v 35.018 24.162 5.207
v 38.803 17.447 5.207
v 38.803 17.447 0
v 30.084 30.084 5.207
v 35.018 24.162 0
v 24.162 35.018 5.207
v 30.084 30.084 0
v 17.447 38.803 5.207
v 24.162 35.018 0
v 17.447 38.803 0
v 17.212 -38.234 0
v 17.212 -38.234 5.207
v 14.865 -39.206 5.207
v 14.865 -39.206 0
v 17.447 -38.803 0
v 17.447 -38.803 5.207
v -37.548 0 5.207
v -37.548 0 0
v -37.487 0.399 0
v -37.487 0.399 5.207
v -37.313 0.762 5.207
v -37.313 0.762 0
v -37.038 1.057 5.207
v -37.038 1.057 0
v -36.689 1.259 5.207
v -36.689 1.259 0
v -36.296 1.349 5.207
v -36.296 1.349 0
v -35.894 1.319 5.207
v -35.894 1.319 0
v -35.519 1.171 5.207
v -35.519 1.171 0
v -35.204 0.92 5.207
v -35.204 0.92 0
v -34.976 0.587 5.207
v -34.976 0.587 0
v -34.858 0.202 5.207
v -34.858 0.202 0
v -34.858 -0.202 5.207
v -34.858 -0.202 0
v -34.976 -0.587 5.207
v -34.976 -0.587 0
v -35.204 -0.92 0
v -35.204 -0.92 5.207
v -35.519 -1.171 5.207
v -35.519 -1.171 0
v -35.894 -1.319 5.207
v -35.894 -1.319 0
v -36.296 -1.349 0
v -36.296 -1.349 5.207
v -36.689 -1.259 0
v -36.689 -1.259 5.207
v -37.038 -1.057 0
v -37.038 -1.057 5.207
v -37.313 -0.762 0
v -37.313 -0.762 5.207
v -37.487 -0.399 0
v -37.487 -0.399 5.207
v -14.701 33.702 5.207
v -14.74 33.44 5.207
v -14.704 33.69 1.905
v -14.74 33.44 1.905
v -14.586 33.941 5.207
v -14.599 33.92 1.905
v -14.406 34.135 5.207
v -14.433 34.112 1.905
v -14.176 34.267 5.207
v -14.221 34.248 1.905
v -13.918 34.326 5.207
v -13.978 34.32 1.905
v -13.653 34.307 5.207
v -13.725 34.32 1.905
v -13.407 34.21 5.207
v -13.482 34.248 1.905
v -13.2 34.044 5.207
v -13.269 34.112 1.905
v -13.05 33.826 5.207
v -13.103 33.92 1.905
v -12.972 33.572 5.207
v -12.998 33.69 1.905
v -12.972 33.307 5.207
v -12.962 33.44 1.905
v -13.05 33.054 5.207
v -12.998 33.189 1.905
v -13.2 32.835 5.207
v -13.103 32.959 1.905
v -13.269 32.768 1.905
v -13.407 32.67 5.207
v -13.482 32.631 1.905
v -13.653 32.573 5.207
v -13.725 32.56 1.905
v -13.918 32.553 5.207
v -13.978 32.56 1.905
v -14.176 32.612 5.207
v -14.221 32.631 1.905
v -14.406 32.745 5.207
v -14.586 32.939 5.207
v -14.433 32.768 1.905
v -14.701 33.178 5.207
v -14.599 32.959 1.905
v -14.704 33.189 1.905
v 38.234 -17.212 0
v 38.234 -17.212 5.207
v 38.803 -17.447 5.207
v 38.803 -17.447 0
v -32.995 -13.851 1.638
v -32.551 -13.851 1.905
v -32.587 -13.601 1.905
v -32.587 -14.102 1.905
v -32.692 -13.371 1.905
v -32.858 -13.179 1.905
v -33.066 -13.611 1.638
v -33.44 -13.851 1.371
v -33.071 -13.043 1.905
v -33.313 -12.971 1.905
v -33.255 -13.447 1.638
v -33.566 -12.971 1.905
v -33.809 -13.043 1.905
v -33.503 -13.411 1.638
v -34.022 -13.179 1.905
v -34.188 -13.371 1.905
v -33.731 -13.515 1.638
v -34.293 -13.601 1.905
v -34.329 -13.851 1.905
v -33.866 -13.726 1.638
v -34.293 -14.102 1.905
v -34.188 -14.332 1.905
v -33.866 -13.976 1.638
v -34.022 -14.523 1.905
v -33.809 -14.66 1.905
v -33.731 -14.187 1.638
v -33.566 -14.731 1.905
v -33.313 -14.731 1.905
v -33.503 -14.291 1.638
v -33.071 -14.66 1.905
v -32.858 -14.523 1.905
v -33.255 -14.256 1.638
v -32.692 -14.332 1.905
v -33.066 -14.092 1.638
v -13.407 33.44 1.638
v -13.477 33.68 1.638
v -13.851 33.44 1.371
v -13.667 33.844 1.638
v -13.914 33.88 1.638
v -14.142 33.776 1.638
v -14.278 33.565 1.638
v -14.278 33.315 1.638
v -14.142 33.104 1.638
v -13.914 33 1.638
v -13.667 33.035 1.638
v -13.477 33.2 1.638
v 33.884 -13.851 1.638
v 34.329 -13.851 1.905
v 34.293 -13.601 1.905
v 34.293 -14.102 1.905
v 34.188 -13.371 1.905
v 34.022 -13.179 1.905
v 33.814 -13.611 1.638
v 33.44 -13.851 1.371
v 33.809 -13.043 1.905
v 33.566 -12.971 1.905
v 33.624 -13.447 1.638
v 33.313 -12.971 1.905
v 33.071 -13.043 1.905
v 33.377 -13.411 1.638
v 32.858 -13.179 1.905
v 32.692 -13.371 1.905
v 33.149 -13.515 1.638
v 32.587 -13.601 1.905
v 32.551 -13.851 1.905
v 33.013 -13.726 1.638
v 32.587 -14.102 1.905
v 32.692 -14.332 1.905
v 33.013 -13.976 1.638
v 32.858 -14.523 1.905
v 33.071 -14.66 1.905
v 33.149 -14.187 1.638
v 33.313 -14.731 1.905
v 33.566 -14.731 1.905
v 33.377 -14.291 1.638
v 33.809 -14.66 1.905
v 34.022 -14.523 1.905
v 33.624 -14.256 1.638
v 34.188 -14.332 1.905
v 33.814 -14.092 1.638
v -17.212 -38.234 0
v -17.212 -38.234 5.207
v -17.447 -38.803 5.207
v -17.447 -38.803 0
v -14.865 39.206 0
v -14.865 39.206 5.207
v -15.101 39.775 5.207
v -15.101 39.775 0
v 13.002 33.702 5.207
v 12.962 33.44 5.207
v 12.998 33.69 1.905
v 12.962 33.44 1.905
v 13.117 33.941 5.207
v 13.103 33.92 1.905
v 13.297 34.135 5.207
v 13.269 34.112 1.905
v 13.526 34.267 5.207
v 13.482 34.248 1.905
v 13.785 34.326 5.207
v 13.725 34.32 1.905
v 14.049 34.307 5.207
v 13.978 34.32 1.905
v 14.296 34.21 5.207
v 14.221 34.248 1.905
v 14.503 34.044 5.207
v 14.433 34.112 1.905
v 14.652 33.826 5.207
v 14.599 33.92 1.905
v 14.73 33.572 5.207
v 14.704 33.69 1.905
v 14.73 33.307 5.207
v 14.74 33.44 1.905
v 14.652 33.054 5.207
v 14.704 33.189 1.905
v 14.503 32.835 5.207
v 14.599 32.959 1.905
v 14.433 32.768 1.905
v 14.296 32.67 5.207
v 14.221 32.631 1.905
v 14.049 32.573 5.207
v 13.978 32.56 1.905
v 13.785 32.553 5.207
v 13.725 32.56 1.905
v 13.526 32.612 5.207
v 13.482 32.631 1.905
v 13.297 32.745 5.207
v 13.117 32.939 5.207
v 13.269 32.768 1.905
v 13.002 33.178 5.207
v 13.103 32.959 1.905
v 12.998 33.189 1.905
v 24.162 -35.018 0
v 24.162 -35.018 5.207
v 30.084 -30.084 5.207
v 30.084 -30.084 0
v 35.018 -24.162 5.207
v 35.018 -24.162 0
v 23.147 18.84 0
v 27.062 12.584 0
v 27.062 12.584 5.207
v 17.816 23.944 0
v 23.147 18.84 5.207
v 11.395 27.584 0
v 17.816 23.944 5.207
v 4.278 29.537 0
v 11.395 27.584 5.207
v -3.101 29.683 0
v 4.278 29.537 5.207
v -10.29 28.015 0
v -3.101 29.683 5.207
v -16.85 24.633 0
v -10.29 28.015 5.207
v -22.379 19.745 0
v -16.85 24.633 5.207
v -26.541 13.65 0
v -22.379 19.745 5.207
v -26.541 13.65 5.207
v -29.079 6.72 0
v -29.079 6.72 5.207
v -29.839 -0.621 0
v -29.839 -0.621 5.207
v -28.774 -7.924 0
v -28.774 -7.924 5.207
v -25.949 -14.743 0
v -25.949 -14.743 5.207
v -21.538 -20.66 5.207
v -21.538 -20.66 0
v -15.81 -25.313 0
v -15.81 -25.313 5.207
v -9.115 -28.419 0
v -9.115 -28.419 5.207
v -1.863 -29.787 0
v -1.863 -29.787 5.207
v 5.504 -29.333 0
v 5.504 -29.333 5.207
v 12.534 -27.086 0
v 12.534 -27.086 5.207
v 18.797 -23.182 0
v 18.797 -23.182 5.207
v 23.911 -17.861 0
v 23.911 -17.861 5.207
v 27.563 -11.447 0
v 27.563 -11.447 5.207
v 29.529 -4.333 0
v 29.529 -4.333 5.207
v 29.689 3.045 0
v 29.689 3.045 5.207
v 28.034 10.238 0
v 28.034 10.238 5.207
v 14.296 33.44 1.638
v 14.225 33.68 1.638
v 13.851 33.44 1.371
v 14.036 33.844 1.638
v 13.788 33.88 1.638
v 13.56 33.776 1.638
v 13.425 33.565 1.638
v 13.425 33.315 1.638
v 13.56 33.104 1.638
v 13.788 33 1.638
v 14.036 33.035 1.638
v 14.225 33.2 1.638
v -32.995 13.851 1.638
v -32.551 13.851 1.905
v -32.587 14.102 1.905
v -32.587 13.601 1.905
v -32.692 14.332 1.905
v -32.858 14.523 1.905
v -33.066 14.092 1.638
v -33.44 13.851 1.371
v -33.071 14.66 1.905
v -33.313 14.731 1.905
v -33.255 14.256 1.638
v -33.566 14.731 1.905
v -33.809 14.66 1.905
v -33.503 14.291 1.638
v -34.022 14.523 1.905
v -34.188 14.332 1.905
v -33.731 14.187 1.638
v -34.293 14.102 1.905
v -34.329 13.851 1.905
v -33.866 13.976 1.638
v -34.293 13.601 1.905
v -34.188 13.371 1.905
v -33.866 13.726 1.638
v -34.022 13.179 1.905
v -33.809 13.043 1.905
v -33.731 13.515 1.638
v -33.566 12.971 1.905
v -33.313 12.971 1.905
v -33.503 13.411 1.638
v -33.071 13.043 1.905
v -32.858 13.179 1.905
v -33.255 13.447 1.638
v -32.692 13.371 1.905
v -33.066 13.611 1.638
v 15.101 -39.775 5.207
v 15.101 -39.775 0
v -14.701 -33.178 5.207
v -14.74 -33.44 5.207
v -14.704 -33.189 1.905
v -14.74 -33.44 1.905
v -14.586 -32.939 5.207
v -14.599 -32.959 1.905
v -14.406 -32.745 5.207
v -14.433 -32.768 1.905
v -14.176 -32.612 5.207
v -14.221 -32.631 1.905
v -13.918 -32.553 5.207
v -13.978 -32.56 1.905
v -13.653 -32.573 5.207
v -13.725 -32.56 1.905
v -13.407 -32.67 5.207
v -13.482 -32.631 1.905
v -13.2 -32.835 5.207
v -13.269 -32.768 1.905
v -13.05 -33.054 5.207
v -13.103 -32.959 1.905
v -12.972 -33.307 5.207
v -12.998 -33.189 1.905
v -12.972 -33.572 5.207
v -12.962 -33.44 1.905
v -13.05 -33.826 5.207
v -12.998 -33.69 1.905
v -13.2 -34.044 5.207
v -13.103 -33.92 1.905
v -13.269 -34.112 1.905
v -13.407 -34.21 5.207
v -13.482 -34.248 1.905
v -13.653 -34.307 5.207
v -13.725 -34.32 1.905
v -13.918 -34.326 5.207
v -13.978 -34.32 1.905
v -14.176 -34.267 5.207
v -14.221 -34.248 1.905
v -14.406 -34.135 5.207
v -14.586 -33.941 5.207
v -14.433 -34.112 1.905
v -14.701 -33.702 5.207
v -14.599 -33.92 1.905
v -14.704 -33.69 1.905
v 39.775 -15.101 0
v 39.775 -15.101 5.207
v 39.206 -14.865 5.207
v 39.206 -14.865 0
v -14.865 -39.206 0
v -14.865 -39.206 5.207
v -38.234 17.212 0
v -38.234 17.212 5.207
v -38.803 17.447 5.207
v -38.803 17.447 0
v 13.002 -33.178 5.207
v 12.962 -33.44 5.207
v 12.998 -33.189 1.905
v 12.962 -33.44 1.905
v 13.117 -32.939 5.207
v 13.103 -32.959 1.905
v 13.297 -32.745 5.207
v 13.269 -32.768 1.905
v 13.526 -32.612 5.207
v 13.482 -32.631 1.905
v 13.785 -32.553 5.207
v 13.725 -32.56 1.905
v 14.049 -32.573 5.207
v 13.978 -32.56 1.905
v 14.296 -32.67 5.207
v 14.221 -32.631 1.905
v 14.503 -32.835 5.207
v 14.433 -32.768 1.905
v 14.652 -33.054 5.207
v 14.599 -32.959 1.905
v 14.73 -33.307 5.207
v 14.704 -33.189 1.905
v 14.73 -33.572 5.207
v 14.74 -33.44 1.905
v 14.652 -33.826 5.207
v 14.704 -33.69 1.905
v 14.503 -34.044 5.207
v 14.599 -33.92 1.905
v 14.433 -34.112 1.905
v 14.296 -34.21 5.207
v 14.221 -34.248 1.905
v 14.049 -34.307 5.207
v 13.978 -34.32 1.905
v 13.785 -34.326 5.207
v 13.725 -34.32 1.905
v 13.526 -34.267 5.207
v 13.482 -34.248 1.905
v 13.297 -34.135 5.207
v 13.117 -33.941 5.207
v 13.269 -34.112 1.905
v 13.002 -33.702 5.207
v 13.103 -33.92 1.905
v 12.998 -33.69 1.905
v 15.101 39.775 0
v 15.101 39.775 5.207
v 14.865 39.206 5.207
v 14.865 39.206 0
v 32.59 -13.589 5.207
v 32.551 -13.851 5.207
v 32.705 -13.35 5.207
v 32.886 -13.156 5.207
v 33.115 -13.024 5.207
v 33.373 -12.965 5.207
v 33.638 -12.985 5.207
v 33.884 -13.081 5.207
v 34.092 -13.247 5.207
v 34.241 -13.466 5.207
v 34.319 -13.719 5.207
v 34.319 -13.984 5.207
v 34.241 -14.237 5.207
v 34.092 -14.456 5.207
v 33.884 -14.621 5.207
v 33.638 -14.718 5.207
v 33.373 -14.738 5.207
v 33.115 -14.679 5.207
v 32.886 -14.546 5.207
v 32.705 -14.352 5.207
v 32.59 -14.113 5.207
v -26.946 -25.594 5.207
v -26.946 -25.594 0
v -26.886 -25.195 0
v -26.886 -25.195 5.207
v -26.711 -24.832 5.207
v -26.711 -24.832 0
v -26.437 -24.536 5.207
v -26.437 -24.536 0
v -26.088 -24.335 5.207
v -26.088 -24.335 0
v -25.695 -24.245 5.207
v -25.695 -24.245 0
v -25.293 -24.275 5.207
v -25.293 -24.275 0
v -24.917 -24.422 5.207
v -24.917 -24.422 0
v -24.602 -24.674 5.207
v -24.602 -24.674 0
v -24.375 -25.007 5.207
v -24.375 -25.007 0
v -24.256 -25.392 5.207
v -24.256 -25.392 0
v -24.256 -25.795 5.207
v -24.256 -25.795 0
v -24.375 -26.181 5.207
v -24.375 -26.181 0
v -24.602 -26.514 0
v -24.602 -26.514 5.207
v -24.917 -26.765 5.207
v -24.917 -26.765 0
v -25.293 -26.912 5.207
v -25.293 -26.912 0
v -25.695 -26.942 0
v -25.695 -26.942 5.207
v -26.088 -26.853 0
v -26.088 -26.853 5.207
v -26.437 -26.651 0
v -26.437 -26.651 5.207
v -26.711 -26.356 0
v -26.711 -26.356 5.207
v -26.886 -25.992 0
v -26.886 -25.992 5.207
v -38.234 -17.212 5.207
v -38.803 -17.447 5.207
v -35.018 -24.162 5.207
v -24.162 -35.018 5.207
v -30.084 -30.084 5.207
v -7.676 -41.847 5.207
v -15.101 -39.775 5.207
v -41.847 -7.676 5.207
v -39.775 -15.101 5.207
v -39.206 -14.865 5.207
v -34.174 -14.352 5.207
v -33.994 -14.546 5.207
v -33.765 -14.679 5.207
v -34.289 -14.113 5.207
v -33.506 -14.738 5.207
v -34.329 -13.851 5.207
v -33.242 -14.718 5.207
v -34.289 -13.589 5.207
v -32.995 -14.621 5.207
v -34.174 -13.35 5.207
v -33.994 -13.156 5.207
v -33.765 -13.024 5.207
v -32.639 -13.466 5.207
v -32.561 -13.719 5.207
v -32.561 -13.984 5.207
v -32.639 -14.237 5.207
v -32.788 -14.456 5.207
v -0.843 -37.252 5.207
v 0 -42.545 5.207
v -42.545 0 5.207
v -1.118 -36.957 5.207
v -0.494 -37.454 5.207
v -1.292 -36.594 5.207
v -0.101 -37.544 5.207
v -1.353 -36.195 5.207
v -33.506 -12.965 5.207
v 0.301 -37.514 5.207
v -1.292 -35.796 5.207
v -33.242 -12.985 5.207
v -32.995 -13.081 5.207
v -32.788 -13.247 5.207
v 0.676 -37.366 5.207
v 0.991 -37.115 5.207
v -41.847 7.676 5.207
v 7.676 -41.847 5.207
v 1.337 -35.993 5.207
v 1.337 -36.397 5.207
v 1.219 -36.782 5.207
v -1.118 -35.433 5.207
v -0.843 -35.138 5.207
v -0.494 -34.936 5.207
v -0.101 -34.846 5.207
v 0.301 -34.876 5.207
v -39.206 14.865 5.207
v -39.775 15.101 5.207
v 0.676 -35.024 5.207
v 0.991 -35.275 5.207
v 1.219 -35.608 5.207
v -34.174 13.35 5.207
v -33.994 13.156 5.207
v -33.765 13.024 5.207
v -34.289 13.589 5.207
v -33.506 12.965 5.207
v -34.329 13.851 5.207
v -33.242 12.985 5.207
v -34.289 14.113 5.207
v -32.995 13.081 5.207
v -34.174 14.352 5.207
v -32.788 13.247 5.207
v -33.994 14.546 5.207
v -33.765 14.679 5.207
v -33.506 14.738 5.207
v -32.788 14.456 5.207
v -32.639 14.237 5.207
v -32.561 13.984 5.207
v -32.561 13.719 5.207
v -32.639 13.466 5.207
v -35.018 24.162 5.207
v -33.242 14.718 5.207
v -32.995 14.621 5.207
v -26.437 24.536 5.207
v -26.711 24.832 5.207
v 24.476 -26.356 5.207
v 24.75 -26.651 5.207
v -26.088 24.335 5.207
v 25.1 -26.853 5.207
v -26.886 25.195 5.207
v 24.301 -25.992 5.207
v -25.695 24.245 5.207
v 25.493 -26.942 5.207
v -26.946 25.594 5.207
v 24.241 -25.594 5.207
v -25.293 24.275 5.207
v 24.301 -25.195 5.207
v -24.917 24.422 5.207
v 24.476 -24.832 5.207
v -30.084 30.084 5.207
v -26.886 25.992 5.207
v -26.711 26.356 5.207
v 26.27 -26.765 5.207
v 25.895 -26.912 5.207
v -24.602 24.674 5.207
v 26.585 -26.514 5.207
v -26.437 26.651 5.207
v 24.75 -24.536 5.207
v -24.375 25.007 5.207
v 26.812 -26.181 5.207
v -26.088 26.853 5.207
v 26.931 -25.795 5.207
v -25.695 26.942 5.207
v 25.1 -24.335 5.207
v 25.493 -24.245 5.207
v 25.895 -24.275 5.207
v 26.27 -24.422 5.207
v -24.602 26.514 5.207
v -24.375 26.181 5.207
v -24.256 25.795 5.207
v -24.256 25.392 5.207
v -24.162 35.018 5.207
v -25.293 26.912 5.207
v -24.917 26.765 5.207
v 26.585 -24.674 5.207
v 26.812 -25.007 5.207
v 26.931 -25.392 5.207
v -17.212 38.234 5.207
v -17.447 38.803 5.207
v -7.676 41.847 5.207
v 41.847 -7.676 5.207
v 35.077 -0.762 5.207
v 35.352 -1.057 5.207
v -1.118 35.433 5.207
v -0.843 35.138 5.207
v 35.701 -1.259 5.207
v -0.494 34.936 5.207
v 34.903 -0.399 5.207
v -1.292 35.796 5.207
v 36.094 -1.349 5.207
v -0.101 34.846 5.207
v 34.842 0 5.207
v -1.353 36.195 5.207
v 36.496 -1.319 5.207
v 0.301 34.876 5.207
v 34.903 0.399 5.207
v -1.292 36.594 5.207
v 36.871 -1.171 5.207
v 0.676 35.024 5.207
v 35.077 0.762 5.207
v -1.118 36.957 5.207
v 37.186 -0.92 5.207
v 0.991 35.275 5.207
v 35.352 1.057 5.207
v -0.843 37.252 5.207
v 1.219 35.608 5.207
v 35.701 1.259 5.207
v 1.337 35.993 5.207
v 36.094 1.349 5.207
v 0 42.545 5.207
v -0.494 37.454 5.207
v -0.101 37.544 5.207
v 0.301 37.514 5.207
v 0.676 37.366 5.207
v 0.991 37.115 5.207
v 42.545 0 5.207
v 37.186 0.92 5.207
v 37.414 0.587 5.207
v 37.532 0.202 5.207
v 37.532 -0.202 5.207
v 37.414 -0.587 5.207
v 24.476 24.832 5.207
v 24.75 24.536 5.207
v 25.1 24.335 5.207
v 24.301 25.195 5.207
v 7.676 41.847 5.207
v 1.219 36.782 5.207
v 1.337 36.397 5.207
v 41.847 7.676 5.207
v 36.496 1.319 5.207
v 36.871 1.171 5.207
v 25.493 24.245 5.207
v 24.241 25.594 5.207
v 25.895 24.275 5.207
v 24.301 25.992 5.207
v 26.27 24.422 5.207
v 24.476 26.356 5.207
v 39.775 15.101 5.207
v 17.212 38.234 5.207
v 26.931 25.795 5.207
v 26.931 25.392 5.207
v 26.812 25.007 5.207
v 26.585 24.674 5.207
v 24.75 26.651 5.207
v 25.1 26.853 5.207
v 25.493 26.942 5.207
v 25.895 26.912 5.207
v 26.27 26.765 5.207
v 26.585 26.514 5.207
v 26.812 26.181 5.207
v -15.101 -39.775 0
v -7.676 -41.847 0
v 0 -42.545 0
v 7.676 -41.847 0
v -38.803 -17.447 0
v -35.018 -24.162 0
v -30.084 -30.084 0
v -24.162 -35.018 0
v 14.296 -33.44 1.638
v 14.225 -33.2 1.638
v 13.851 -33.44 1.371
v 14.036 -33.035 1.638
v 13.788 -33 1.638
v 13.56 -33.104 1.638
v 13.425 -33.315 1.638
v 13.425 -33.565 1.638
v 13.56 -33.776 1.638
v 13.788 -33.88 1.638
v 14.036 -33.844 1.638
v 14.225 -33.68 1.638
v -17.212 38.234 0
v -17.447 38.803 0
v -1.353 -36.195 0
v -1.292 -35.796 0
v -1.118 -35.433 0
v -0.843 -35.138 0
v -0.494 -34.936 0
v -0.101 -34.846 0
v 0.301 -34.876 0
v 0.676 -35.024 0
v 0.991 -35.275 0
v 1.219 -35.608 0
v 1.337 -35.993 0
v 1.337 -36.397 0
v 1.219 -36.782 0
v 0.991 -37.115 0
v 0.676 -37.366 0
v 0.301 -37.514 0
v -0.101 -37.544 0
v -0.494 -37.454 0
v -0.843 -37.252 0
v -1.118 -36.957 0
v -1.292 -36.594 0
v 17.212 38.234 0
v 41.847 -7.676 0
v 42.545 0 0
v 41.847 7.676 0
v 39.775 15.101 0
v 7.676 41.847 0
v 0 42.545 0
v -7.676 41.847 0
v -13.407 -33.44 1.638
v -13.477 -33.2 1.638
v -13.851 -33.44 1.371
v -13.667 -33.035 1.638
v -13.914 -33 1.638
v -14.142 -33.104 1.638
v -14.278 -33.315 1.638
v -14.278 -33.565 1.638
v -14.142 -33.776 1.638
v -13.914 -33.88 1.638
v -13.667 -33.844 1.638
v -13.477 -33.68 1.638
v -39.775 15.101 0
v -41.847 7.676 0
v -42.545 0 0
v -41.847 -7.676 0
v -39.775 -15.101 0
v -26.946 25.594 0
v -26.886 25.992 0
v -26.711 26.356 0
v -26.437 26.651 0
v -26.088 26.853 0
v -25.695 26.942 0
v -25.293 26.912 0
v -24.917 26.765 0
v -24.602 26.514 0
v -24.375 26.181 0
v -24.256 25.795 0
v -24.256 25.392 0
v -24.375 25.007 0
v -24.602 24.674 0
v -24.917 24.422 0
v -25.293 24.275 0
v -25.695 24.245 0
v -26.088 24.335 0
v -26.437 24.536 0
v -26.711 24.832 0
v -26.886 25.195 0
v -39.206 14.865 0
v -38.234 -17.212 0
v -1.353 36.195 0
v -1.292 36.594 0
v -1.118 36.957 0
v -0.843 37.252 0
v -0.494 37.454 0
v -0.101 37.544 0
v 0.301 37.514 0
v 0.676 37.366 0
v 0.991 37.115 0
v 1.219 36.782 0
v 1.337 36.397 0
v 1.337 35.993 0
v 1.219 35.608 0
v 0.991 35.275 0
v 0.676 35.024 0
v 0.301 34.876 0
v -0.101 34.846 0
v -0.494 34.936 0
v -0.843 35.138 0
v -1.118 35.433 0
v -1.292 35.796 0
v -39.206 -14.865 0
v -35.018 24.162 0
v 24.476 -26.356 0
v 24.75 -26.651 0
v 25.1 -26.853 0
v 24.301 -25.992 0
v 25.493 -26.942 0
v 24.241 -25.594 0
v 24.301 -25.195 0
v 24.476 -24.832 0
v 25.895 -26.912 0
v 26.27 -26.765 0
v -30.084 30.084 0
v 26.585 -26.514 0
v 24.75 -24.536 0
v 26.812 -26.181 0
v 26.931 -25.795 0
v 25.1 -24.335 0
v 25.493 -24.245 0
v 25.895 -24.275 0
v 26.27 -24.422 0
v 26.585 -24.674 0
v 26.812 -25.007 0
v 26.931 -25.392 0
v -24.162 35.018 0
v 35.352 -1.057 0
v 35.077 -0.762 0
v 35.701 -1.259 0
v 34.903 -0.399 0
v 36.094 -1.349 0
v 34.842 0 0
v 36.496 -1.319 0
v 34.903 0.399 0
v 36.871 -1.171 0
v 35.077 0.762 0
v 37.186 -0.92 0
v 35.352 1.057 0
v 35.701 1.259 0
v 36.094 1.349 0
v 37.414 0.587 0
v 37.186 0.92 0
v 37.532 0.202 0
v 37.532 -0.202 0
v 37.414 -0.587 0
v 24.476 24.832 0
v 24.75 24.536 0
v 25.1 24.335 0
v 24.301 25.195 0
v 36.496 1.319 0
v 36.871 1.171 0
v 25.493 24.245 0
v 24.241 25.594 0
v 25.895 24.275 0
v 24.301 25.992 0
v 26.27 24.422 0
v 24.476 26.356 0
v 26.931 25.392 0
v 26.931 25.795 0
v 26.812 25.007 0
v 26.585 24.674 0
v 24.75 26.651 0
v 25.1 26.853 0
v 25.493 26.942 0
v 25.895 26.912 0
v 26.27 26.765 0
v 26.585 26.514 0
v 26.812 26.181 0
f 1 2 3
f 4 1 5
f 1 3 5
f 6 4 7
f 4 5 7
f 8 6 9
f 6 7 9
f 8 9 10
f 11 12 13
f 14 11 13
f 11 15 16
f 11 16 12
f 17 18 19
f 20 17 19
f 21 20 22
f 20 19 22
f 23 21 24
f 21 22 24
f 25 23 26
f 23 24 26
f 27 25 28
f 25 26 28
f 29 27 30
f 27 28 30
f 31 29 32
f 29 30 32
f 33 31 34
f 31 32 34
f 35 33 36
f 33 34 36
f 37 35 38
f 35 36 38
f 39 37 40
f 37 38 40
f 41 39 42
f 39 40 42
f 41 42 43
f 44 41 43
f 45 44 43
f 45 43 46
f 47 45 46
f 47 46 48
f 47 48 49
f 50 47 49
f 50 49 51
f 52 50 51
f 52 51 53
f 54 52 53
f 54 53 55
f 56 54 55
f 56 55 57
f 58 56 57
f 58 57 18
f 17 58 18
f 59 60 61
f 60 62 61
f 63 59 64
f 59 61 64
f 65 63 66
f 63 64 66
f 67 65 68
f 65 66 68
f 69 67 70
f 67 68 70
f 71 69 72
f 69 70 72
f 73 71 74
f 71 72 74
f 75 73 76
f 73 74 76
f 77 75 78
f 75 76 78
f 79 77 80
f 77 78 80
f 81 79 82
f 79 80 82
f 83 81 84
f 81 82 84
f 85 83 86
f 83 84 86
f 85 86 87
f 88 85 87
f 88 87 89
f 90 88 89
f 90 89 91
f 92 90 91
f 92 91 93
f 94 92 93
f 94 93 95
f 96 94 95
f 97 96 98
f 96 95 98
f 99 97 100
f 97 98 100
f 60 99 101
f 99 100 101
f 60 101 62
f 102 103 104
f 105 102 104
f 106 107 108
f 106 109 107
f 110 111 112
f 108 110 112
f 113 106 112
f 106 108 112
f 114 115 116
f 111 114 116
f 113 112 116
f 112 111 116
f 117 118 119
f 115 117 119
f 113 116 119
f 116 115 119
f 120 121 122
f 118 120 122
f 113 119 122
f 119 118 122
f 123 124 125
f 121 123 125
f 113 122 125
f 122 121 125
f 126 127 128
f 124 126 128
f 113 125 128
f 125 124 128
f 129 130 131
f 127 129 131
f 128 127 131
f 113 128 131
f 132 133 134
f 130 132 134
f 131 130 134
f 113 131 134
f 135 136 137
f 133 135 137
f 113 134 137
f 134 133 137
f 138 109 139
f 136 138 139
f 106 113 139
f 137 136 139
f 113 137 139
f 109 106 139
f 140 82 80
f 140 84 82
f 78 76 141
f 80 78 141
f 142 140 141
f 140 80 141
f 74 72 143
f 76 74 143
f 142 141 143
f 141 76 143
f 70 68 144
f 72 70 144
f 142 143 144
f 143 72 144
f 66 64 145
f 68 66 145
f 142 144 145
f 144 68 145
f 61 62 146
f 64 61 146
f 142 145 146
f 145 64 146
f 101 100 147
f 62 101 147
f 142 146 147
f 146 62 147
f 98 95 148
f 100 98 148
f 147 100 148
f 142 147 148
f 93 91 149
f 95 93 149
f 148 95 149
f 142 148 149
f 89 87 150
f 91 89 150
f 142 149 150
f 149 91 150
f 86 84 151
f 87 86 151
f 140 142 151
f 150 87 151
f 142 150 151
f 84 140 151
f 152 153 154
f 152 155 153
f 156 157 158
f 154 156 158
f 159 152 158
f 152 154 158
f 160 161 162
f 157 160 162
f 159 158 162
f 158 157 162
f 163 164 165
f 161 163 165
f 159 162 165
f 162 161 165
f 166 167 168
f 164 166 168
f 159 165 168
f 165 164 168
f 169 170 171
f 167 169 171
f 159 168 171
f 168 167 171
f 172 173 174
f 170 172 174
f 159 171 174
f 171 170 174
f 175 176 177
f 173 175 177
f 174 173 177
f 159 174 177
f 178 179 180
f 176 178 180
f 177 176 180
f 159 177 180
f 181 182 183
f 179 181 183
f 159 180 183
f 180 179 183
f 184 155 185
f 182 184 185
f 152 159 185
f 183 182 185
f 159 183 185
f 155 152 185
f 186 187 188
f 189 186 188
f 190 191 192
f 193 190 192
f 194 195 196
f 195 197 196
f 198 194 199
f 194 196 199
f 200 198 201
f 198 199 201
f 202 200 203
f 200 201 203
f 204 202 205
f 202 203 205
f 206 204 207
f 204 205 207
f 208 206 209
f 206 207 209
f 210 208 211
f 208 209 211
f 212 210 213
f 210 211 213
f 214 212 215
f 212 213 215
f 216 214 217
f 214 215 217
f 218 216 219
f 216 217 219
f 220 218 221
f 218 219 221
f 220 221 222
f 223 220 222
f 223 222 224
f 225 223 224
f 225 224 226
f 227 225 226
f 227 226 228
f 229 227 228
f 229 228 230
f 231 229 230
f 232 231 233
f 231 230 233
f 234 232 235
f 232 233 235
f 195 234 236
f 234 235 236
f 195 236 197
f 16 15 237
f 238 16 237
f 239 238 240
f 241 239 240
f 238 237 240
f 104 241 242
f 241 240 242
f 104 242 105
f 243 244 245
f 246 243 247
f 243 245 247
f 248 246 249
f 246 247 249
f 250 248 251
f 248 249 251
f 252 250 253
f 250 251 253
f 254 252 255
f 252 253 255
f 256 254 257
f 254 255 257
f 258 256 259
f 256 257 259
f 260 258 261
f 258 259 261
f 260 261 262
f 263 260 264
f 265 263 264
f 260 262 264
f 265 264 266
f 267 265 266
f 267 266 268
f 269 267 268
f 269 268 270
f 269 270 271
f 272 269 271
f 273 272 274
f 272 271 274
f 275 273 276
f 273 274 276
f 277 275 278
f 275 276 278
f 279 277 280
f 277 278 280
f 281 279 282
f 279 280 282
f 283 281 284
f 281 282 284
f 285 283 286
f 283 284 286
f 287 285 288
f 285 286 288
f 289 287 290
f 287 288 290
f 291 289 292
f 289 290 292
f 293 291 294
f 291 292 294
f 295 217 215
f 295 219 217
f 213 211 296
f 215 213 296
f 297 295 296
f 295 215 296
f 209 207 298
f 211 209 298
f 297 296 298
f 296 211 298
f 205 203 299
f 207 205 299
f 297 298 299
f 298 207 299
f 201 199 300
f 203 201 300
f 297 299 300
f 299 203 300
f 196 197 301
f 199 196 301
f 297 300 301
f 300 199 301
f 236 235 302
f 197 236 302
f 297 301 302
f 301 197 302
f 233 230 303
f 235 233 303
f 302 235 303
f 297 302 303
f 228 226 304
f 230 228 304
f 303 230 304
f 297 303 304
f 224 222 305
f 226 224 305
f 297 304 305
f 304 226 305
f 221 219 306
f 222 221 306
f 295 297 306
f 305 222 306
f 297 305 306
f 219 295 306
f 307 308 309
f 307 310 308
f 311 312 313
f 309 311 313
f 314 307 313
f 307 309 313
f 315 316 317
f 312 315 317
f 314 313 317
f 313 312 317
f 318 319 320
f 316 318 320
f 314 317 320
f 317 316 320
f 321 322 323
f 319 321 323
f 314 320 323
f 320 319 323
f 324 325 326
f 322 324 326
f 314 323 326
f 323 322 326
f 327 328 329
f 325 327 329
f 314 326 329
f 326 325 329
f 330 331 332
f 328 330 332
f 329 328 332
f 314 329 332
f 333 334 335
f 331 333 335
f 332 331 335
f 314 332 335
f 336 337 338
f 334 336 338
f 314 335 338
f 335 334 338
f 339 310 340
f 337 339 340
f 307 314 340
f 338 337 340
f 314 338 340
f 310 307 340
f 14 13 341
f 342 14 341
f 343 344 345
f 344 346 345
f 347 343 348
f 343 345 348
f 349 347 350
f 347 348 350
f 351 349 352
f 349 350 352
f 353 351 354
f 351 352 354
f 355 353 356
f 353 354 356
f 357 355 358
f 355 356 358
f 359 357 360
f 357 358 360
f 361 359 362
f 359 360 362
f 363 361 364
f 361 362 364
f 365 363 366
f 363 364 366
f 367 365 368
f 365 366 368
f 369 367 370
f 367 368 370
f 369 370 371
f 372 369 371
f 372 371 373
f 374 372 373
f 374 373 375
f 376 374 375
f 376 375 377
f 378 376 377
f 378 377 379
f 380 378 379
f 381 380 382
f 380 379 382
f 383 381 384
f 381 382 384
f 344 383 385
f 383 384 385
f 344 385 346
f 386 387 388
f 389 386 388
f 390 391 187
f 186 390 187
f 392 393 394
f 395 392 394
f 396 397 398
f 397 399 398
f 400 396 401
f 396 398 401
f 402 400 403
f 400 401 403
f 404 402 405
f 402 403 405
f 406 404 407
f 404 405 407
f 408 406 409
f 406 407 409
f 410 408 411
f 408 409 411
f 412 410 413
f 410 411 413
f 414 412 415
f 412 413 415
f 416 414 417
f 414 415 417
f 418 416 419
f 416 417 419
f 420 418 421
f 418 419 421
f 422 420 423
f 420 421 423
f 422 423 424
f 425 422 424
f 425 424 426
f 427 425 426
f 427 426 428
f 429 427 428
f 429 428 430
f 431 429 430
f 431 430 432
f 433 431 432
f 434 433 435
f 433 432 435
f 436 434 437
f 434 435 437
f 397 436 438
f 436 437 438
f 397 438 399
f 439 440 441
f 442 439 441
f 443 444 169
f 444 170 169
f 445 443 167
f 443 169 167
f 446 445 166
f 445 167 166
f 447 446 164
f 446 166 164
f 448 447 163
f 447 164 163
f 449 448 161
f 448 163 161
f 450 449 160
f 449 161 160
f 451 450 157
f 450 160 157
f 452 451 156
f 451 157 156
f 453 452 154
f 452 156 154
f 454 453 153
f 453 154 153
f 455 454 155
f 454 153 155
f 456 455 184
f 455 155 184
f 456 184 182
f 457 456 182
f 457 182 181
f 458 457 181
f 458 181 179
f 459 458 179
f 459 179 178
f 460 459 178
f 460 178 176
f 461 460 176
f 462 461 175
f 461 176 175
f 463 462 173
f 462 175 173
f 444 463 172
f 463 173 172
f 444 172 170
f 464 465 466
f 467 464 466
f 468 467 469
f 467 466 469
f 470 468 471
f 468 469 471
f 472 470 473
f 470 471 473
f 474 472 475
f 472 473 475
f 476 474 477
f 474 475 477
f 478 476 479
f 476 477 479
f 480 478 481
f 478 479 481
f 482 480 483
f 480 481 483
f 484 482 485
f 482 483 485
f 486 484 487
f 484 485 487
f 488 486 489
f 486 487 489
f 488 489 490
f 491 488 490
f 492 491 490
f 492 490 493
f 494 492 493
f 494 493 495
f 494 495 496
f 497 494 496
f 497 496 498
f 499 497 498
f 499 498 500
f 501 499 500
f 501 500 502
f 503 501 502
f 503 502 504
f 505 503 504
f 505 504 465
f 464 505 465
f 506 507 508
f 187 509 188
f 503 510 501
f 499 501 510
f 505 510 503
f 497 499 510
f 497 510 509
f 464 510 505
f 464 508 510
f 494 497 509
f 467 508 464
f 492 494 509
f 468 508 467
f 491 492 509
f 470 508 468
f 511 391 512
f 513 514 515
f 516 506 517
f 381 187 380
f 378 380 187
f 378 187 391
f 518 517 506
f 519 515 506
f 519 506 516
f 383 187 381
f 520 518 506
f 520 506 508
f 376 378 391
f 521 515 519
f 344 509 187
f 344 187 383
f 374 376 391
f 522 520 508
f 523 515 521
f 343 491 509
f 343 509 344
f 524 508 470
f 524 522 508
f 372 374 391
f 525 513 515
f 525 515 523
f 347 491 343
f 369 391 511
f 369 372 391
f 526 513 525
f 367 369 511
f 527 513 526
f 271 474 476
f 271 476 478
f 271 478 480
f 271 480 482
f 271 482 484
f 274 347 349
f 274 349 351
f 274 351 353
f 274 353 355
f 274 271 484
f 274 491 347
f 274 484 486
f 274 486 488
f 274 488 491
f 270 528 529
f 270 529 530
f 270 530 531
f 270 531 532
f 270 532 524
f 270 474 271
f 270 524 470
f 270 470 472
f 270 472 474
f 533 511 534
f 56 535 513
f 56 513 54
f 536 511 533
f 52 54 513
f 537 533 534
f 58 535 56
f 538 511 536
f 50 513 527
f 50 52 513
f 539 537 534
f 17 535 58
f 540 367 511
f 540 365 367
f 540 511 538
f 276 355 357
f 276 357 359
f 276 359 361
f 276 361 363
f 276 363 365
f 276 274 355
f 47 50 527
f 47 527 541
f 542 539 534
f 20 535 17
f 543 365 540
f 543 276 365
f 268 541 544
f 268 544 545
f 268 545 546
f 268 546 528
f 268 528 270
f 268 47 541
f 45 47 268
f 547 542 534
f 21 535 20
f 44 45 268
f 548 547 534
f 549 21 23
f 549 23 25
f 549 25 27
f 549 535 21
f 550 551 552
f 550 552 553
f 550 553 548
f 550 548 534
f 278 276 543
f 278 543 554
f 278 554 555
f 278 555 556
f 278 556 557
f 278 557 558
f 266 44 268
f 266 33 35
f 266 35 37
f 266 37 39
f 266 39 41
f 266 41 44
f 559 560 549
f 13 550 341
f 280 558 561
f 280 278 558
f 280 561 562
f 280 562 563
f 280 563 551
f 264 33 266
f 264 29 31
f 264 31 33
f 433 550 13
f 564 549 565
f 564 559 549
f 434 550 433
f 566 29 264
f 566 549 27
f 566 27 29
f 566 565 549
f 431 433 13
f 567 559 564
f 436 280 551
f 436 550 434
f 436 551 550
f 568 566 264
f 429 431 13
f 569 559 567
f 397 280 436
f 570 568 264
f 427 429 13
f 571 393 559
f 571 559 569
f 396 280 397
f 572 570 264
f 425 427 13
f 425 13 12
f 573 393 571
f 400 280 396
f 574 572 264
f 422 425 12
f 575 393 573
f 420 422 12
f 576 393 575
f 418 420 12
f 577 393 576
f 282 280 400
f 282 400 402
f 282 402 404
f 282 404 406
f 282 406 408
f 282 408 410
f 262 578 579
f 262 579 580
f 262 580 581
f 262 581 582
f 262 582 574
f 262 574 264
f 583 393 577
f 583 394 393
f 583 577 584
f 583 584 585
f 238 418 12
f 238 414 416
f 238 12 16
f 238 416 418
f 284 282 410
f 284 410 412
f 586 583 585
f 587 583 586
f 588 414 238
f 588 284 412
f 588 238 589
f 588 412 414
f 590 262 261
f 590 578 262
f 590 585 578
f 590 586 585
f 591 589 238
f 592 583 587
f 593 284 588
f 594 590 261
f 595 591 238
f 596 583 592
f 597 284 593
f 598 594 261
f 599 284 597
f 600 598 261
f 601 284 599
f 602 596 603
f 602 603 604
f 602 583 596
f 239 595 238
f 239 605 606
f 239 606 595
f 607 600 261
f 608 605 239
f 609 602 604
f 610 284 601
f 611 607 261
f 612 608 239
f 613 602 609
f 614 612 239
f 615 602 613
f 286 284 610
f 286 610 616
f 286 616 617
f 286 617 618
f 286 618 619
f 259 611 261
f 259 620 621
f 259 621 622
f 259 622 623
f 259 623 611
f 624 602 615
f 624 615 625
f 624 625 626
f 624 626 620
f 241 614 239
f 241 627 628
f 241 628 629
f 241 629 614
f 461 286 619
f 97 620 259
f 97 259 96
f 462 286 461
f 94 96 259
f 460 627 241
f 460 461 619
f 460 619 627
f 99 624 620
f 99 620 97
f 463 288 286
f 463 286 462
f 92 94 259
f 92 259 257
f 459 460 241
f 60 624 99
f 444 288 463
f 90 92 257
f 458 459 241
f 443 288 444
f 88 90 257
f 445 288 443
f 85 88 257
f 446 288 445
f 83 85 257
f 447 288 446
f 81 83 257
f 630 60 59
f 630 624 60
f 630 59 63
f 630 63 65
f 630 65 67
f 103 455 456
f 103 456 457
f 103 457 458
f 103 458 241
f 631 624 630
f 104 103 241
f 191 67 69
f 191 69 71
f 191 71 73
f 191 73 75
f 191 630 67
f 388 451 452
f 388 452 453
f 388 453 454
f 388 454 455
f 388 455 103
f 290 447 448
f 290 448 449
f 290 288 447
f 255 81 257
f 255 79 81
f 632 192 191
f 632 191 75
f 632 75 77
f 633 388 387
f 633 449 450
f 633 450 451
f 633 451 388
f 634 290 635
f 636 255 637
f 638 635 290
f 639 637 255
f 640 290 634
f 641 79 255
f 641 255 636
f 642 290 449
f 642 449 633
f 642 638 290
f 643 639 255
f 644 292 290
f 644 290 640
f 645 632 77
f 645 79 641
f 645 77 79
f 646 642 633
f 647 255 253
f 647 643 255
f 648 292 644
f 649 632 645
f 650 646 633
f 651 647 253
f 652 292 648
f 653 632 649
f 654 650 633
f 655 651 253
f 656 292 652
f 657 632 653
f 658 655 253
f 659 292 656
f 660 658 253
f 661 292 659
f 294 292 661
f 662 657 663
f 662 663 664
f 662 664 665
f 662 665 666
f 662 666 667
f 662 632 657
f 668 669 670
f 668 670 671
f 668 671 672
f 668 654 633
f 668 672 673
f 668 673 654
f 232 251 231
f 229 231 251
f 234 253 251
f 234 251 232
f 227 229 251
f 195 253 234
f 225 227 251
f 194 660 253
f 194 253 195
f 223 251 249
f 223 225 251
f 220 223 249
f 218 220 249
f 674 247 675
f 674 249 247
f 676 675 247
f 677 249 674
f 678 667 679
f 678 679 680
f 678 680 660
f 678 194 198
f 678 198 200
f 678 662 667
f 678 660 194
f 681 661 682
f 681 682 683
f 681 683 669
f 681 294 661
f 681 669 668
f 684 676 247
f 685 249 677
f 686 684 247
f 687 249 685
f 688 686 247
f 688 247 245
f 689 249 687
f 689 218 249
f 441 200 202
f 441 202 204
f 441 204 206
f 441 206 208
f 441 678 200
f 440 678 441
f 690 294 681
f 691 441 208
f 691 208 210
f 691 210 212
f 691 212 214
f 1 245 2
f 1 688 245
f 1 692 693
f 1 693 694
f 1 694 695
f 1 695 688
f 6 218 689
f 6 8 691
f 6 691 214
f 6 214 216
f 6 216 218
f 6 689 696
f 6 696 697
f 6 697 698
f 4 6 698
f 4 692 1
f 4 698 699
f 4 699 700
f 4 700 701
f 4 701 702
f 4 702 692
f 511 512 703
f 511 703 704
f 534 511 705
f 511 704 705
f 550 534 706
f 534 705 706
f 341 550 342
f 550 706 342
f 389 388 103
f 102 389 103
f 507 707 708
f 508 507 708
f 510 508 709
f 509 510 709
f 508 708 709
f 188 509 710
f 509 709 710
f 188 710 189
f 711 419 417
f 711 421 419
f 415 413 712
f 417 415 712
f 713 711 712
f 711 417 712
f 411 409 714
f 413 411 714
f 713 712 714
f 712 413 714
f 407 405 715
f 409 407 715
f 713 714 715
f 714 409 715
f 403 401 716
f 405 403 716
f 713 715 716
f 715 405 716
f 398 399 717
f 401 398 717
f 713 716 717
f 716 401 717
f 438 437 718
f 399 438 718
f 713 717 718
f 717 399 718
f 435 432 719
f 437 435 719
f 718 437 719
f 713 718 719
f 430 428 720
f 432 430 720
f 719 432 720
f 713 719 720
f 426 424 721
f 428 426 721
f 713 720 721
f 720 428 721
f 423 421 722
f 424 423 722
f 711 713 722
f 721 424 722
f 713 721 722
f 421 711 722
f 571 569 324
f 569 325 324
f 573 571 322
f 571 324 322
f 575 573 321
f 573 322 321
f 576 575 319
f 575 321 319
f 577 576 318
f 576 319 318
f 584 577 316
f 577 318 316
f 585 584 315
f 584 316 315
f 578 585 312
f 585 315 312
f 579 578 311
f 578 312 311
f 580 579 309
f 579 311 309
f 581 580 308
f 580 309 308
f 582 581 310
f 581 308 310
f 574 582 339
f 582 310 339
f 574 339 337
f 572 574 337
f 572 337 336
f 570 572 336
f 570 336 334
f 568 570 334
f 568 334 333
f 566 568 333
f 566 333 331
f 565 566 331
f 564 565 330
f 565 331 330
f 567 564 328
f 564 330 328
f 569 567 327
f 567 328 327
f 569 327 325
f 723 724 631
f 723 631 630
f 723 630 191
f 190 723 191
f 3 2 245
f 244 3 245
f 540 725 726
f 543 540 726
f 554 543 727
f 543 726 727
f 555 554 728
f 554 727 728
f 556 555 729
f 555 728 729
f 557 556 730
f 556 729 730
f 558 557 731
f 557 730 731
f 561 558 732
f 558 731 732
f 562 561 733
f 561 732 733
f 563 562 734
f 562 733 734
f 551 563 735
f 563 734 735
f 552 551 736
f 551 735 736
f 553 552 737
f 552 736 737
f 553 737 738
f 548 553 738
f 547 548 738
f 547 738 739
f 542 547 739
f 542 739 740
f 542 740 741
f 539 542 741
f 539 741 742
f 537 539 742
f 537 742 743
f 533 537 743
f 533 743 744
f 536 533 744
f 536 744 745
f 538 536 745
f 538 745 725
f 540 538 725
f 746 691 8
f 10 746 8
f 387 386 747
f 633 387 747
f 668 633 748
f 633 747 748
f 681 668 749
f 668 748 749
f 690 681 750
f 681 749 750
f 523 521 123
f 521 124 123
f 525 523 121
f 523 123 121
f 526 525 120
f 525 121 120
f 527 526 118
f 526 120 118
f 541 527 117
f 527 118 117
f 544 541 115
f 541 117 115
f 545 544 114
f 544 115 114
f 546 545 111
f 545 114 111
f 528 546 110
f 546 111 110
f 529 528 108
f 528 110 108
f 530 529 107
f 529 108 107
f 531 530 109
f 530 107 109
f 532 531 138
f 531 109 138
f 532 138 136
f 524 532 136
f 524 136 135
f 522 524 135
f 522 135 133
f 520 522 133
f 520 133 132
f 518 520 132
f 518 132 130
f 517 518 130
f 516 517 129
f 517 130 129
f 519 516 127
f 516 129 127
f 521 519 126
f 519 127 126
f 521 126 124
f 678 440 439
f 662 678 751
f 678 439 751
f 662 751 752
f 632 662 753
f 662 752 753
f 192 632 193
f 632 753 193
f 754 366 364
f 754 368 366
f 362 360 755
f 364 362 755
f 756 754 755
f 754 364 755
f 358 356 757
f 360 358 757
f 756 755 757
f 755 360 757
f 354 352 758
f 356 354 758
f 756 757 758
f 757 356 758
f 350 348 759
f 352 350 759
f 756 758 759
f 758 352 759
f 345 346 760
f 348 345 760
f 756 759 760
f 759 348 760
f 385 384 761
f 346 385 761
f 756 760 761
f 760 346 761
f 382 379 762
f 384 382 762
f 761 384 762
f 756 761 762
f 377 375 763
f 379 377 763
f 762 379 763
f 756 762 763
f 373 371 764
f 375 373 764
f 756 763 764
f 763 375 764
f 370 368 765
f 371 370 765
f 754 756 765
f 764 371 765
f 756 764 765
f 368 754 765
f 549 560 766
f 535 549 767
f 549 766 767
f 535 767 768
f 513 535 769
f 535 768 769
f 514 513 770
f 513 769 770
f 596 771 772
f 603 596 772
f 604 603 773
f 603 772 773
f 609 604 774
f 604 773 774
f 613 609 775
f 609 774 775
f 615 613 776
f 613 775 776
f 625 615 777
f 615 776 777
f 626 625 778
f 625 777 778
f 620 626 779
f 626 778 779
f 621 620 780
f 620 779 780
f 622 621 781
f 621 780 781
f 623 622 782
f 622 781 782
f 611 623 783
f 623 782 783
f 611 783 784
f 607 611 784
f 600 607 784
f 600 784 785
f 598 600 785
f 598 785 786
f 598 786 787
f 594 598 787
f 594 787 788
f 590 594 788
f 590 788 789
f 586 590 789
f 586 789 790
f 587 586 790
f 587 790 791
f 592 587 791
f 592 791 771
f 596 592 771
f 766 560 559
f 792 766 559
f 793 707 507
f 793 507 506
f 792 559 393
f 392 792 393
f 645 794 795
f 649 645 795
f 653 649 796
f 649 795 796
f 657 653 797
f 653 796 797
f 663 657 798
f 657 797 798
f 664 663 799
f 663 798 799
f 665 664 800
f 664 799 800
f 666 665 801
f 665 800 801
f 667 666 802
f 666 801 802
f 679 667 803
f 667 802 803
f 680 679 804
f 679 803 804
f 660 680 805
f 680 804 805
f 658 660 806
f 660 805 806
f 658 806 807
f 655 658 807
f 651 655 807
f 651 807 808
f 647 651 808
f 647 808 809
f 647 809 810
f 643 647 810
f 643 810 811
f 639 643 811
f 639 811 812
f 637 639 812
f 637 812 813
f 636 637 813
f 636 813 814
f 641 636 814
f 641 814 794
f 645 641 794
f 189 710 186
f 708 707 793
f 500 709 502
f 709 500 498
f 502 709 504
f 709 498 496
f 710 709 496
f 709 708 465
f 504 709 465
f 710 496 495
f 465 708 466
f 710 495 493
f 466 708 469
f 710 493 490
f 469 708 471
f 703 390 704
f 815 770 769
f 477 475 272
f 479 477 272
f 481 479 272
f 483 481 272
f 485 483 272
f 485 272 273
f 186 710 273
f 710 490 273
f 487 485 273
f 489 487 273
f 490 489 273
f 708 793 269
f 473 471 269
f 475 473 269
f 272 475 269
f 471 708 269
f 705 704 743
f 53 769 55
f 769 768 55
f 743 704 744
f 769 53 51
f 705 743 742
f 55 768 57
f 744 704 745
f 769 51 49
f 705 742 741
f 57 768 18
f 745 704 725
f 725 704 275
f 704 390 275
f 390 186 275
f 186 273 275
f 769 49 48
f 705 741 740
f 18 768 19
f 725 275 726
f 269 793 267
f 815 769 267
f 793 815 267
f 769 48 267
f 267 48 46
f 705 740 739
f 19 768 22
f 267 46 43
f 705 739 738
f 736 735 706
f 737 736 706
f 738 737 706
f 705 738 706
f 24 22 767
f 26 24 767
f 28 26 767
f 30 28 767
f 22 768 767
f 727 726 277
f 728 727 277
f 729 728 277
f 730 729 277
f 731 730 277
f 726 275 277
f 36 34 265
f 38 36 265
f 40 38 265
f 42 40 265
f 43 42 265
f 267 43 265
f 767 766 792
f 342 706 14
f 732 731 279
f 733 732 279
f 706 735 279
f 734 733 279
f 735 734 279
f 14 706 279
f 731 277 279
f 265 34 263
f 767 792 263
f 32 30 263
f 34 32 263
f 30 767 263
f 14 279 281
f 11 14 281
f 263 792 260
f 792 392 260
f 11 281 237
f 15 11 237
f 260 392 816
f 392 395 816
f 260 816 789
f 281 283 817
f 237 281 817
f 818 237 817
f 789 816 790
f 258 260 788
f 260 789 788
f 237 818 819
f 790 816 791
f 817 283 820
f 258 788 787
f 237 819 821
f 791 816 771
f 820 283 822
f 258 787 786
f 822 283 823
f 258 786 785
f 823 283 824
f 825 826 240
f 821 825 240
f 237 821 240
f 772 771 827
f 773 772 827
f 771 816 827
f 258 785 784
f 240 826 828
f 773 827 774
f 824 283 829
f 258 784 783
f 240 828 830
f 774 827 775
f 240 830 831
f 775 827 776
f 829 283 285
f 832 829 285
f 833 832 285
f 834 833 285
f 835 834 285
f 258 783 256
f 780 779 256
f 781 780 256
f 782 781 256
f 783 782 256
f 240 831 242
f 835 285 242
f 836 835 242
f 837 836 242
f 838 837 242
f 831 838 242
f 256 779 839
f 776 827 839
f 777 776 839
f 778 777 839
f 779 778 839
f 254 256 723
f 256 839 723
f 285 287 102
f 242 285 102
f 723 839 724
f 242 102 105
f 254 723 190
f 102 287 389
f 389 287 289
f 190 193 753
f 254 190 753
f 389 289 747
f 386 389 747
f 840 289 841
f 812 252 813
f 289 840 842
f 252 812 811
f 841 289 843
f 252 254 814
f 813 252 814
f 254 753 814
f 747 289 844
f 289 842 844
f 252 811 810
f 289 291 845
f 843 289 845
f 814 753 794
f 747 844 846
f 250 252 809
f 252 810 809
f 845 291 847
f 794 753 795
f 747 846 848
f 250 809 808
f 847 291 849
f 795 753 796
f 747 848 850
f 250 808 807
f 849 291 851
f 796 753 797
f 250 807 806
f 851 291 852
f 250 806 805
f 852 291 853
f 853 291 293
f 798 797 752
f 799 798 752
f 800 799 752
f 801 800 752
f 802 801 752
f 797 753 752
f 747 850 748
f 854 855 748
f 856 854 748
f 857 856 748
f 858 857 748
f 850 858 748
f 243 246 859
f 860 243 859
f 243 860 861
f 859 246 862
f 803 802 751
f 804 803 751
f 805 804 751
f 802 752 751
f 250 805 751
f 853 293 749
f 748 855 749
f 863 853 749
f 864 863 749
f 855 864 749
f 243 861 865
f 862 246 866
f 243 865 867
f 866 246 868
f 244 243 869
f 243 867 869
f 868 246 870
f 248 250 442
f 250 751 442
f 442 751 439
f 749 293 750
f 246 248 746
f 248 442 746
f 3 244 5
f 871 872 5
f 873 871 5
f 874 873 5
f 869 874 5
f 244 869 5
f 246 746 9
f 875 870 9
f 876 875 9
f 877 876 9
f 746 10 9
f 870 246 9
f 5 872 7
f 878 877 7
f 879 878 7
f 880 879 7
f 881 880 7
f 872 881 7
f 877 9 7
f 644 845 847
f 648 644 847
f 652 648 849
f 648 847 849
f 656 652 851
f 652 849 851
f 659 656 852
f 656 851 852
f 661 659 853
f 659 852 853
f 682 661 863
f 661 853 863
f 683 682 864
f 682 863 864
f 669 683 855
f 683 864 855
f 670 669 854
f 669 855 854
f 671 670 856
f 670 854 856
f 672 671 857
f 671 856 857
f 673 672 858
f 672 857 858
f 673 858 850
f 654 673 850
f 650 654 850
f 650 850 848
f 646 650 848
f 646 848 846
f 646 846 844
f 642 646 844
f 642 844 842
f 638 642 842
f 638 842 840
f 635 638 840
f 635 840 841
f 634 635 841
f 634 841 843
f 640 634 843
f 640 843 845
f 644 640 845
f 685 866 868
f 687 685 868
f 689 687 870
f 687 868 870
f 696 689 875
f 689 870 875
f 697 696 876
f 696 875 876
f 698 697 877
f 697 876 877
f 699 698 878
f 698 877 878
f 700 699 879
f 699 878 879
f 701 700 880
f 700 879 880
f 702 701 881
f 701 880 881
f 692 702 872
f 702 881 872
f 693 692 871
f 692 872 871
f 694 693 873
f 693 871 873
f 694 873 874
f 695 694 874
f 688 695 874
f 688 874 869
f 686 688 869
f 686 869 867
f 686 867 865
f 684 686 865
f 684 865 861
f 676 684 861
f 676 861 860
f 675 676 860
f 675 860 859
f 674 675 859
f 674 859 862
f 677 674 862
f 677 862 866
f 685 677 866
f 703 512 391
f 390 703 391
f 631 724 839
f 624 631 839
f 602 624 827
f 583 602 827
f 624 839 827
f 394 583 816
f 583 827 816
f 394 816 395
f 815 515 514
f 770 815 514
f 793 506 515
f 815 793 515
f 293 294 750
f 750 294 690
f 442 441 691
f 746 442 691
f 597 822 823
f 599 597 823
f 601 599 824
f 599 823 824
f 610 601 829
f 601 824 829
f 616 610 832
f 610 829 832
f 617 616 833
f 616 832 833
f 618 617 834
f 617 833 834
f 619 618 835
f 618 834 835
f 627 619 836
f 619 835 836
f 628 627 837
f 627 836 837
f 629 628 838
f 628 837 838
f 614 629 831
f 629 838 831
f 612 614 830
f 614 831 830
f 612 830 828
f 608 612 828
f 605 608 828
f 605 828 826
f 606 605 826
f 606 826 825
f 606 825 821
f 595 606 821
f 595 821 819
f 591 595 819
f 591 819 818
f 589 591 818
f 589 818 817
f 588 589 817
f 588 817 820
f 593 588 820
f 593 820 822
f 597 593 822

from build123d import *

# Parameters (mm, degrees)
SKETCH4_R                 = 42.545
BOSS_EXTRUDE2_DEPTH       = 5.207
SKETCH5_R                 = 29.845
CUT_EXTRUDE5_DEPTH        = 6.207
CUT_EXTRUDE11_DEPTH       = 6.207
F_6_32_TAPPED_HOLE1_D     = 2.7051
F_2_56_TAPPED_HOLE1_D     = 1.778
F_2_56_TAPPED_HOLE1_DEPTH = 3.302
F_2_56_TAPPED_HOLE1_TIP   = 0.53416509


with BuildPart() as part:
    # Sketch4 → Boss-Extrude2 (new body)
    with BuildSketch(Plane.XY):
        Circle(SKETCH4_R)
    extrude(amount=BOSS_EXTRUDE2_DEPTH)

    # Sketch5 → Cut-Extrude5 (cut, through all)
    with BuildSketch(Plane.XY.offset(5.207)):
        Circle(SKETCH5_R)
    extrude(amount=-CUT_EXTRUDE5_DEPTH, mode=Mode.SUBTRACT)

    # Sketch8 → Cut-Extrude11 (cut, through all)
    with BuildSketch(Plane.XY.offset(5.207)):
        Polygon((45.273745286, 20.127637411), (26.500513186, 12.351510066), (27.472529104, 10.004856053), (46.245761204, 17.780983399), align=None)
        Polygon((17.697597616, 39.407110255), (15.350943603, 40.379126173), (14.864935644, 39.205799167), (17.211589657, 38.233783248), align=None)
        Polygon((-15.350943603, 40.379126173), (-17.697597616, 39.407110255), (-17.211589657, 38.233783248), (-14.864935644, 39.205799167), align=None)
        Polygon((-39.407110255, 17.697597616), (-40.379126173, 15.350943603), (-39.205799167, 14.864935644), (-38.233783248, 17.211589657), align=None)
        Polygon((-40.379126173, -15.350943603), (-39.407110255, -17.697597616), (-38.233783248, -17.211589657), (-39.205799167, -14.864935644), align=None)
        Polygon((-17.697597616, -39.407110255), (-15.350943603, -40.379126173), (-14.864935644, -39.205799167), (-17.211589657, -38.233783248), align=None)
        Polygon((15.350943603, -40.379126173), (17.697597616, -39.407110255), (17.211589657, -38.233783248), (14.864935644, -39.205799167), align=None)
        Polygon((39.407110255, -17.697597616), (40.379126173, -15.350943603), (39.205799167, -14.864935644), (38.233783248, -17.211589657), align=None)
    extrude(amount=-CUT_EXTRUDE11_DEPTH, mode=Mode.SUBTRACT)

    # #6-32 Tapped Hole1 (through all)
    with Locations(Plane.XY.offset(5.207)):
        with Locations((36.195, 0), (25.593729945, -25.593729945), (0, -36.195), (-25.593729945, -25.593729945), (-36.195, 0), (-25.593729945, 25.593729945), (0, 36.195), (25.593729945, 25.593729945)):
            Hole(F_6_32_TAPPED_HOLE1_D / 2)

    # #2-56 Tapped Hole1
    with Locations(Plane.XY.offset(5.207)):
        with Locations((13.851226834, 33.439819679), (-13.851226834, 33.439819679), (-33.439819679, 13.851226834), (-33.439819679, -13.851226834), (-13.851226834, -33.439819679), (13.851226834, -33.439819679), (33.439819679, -13.851226834), (33.439819679, 13.851226834)):
            Hole(F_2_56_TAPPED_HOLE1_D / 2, depth=F_2_56_TAPPED_HOLE1_DEPTH)
            with Locations((0, 0, -(F_2_56_TAPPED_HOLE1_DEPTH + F_2_56_TAPPED_HOLE1_TIP / 2))):  # 118° drill point
                Cone(0, F_2_56_TAPPED_HOLE1_D / 2, F_2_56_TAPPED_HOLE1_TIP, mode=Mode.SUBTRACT)


solid = part.part
